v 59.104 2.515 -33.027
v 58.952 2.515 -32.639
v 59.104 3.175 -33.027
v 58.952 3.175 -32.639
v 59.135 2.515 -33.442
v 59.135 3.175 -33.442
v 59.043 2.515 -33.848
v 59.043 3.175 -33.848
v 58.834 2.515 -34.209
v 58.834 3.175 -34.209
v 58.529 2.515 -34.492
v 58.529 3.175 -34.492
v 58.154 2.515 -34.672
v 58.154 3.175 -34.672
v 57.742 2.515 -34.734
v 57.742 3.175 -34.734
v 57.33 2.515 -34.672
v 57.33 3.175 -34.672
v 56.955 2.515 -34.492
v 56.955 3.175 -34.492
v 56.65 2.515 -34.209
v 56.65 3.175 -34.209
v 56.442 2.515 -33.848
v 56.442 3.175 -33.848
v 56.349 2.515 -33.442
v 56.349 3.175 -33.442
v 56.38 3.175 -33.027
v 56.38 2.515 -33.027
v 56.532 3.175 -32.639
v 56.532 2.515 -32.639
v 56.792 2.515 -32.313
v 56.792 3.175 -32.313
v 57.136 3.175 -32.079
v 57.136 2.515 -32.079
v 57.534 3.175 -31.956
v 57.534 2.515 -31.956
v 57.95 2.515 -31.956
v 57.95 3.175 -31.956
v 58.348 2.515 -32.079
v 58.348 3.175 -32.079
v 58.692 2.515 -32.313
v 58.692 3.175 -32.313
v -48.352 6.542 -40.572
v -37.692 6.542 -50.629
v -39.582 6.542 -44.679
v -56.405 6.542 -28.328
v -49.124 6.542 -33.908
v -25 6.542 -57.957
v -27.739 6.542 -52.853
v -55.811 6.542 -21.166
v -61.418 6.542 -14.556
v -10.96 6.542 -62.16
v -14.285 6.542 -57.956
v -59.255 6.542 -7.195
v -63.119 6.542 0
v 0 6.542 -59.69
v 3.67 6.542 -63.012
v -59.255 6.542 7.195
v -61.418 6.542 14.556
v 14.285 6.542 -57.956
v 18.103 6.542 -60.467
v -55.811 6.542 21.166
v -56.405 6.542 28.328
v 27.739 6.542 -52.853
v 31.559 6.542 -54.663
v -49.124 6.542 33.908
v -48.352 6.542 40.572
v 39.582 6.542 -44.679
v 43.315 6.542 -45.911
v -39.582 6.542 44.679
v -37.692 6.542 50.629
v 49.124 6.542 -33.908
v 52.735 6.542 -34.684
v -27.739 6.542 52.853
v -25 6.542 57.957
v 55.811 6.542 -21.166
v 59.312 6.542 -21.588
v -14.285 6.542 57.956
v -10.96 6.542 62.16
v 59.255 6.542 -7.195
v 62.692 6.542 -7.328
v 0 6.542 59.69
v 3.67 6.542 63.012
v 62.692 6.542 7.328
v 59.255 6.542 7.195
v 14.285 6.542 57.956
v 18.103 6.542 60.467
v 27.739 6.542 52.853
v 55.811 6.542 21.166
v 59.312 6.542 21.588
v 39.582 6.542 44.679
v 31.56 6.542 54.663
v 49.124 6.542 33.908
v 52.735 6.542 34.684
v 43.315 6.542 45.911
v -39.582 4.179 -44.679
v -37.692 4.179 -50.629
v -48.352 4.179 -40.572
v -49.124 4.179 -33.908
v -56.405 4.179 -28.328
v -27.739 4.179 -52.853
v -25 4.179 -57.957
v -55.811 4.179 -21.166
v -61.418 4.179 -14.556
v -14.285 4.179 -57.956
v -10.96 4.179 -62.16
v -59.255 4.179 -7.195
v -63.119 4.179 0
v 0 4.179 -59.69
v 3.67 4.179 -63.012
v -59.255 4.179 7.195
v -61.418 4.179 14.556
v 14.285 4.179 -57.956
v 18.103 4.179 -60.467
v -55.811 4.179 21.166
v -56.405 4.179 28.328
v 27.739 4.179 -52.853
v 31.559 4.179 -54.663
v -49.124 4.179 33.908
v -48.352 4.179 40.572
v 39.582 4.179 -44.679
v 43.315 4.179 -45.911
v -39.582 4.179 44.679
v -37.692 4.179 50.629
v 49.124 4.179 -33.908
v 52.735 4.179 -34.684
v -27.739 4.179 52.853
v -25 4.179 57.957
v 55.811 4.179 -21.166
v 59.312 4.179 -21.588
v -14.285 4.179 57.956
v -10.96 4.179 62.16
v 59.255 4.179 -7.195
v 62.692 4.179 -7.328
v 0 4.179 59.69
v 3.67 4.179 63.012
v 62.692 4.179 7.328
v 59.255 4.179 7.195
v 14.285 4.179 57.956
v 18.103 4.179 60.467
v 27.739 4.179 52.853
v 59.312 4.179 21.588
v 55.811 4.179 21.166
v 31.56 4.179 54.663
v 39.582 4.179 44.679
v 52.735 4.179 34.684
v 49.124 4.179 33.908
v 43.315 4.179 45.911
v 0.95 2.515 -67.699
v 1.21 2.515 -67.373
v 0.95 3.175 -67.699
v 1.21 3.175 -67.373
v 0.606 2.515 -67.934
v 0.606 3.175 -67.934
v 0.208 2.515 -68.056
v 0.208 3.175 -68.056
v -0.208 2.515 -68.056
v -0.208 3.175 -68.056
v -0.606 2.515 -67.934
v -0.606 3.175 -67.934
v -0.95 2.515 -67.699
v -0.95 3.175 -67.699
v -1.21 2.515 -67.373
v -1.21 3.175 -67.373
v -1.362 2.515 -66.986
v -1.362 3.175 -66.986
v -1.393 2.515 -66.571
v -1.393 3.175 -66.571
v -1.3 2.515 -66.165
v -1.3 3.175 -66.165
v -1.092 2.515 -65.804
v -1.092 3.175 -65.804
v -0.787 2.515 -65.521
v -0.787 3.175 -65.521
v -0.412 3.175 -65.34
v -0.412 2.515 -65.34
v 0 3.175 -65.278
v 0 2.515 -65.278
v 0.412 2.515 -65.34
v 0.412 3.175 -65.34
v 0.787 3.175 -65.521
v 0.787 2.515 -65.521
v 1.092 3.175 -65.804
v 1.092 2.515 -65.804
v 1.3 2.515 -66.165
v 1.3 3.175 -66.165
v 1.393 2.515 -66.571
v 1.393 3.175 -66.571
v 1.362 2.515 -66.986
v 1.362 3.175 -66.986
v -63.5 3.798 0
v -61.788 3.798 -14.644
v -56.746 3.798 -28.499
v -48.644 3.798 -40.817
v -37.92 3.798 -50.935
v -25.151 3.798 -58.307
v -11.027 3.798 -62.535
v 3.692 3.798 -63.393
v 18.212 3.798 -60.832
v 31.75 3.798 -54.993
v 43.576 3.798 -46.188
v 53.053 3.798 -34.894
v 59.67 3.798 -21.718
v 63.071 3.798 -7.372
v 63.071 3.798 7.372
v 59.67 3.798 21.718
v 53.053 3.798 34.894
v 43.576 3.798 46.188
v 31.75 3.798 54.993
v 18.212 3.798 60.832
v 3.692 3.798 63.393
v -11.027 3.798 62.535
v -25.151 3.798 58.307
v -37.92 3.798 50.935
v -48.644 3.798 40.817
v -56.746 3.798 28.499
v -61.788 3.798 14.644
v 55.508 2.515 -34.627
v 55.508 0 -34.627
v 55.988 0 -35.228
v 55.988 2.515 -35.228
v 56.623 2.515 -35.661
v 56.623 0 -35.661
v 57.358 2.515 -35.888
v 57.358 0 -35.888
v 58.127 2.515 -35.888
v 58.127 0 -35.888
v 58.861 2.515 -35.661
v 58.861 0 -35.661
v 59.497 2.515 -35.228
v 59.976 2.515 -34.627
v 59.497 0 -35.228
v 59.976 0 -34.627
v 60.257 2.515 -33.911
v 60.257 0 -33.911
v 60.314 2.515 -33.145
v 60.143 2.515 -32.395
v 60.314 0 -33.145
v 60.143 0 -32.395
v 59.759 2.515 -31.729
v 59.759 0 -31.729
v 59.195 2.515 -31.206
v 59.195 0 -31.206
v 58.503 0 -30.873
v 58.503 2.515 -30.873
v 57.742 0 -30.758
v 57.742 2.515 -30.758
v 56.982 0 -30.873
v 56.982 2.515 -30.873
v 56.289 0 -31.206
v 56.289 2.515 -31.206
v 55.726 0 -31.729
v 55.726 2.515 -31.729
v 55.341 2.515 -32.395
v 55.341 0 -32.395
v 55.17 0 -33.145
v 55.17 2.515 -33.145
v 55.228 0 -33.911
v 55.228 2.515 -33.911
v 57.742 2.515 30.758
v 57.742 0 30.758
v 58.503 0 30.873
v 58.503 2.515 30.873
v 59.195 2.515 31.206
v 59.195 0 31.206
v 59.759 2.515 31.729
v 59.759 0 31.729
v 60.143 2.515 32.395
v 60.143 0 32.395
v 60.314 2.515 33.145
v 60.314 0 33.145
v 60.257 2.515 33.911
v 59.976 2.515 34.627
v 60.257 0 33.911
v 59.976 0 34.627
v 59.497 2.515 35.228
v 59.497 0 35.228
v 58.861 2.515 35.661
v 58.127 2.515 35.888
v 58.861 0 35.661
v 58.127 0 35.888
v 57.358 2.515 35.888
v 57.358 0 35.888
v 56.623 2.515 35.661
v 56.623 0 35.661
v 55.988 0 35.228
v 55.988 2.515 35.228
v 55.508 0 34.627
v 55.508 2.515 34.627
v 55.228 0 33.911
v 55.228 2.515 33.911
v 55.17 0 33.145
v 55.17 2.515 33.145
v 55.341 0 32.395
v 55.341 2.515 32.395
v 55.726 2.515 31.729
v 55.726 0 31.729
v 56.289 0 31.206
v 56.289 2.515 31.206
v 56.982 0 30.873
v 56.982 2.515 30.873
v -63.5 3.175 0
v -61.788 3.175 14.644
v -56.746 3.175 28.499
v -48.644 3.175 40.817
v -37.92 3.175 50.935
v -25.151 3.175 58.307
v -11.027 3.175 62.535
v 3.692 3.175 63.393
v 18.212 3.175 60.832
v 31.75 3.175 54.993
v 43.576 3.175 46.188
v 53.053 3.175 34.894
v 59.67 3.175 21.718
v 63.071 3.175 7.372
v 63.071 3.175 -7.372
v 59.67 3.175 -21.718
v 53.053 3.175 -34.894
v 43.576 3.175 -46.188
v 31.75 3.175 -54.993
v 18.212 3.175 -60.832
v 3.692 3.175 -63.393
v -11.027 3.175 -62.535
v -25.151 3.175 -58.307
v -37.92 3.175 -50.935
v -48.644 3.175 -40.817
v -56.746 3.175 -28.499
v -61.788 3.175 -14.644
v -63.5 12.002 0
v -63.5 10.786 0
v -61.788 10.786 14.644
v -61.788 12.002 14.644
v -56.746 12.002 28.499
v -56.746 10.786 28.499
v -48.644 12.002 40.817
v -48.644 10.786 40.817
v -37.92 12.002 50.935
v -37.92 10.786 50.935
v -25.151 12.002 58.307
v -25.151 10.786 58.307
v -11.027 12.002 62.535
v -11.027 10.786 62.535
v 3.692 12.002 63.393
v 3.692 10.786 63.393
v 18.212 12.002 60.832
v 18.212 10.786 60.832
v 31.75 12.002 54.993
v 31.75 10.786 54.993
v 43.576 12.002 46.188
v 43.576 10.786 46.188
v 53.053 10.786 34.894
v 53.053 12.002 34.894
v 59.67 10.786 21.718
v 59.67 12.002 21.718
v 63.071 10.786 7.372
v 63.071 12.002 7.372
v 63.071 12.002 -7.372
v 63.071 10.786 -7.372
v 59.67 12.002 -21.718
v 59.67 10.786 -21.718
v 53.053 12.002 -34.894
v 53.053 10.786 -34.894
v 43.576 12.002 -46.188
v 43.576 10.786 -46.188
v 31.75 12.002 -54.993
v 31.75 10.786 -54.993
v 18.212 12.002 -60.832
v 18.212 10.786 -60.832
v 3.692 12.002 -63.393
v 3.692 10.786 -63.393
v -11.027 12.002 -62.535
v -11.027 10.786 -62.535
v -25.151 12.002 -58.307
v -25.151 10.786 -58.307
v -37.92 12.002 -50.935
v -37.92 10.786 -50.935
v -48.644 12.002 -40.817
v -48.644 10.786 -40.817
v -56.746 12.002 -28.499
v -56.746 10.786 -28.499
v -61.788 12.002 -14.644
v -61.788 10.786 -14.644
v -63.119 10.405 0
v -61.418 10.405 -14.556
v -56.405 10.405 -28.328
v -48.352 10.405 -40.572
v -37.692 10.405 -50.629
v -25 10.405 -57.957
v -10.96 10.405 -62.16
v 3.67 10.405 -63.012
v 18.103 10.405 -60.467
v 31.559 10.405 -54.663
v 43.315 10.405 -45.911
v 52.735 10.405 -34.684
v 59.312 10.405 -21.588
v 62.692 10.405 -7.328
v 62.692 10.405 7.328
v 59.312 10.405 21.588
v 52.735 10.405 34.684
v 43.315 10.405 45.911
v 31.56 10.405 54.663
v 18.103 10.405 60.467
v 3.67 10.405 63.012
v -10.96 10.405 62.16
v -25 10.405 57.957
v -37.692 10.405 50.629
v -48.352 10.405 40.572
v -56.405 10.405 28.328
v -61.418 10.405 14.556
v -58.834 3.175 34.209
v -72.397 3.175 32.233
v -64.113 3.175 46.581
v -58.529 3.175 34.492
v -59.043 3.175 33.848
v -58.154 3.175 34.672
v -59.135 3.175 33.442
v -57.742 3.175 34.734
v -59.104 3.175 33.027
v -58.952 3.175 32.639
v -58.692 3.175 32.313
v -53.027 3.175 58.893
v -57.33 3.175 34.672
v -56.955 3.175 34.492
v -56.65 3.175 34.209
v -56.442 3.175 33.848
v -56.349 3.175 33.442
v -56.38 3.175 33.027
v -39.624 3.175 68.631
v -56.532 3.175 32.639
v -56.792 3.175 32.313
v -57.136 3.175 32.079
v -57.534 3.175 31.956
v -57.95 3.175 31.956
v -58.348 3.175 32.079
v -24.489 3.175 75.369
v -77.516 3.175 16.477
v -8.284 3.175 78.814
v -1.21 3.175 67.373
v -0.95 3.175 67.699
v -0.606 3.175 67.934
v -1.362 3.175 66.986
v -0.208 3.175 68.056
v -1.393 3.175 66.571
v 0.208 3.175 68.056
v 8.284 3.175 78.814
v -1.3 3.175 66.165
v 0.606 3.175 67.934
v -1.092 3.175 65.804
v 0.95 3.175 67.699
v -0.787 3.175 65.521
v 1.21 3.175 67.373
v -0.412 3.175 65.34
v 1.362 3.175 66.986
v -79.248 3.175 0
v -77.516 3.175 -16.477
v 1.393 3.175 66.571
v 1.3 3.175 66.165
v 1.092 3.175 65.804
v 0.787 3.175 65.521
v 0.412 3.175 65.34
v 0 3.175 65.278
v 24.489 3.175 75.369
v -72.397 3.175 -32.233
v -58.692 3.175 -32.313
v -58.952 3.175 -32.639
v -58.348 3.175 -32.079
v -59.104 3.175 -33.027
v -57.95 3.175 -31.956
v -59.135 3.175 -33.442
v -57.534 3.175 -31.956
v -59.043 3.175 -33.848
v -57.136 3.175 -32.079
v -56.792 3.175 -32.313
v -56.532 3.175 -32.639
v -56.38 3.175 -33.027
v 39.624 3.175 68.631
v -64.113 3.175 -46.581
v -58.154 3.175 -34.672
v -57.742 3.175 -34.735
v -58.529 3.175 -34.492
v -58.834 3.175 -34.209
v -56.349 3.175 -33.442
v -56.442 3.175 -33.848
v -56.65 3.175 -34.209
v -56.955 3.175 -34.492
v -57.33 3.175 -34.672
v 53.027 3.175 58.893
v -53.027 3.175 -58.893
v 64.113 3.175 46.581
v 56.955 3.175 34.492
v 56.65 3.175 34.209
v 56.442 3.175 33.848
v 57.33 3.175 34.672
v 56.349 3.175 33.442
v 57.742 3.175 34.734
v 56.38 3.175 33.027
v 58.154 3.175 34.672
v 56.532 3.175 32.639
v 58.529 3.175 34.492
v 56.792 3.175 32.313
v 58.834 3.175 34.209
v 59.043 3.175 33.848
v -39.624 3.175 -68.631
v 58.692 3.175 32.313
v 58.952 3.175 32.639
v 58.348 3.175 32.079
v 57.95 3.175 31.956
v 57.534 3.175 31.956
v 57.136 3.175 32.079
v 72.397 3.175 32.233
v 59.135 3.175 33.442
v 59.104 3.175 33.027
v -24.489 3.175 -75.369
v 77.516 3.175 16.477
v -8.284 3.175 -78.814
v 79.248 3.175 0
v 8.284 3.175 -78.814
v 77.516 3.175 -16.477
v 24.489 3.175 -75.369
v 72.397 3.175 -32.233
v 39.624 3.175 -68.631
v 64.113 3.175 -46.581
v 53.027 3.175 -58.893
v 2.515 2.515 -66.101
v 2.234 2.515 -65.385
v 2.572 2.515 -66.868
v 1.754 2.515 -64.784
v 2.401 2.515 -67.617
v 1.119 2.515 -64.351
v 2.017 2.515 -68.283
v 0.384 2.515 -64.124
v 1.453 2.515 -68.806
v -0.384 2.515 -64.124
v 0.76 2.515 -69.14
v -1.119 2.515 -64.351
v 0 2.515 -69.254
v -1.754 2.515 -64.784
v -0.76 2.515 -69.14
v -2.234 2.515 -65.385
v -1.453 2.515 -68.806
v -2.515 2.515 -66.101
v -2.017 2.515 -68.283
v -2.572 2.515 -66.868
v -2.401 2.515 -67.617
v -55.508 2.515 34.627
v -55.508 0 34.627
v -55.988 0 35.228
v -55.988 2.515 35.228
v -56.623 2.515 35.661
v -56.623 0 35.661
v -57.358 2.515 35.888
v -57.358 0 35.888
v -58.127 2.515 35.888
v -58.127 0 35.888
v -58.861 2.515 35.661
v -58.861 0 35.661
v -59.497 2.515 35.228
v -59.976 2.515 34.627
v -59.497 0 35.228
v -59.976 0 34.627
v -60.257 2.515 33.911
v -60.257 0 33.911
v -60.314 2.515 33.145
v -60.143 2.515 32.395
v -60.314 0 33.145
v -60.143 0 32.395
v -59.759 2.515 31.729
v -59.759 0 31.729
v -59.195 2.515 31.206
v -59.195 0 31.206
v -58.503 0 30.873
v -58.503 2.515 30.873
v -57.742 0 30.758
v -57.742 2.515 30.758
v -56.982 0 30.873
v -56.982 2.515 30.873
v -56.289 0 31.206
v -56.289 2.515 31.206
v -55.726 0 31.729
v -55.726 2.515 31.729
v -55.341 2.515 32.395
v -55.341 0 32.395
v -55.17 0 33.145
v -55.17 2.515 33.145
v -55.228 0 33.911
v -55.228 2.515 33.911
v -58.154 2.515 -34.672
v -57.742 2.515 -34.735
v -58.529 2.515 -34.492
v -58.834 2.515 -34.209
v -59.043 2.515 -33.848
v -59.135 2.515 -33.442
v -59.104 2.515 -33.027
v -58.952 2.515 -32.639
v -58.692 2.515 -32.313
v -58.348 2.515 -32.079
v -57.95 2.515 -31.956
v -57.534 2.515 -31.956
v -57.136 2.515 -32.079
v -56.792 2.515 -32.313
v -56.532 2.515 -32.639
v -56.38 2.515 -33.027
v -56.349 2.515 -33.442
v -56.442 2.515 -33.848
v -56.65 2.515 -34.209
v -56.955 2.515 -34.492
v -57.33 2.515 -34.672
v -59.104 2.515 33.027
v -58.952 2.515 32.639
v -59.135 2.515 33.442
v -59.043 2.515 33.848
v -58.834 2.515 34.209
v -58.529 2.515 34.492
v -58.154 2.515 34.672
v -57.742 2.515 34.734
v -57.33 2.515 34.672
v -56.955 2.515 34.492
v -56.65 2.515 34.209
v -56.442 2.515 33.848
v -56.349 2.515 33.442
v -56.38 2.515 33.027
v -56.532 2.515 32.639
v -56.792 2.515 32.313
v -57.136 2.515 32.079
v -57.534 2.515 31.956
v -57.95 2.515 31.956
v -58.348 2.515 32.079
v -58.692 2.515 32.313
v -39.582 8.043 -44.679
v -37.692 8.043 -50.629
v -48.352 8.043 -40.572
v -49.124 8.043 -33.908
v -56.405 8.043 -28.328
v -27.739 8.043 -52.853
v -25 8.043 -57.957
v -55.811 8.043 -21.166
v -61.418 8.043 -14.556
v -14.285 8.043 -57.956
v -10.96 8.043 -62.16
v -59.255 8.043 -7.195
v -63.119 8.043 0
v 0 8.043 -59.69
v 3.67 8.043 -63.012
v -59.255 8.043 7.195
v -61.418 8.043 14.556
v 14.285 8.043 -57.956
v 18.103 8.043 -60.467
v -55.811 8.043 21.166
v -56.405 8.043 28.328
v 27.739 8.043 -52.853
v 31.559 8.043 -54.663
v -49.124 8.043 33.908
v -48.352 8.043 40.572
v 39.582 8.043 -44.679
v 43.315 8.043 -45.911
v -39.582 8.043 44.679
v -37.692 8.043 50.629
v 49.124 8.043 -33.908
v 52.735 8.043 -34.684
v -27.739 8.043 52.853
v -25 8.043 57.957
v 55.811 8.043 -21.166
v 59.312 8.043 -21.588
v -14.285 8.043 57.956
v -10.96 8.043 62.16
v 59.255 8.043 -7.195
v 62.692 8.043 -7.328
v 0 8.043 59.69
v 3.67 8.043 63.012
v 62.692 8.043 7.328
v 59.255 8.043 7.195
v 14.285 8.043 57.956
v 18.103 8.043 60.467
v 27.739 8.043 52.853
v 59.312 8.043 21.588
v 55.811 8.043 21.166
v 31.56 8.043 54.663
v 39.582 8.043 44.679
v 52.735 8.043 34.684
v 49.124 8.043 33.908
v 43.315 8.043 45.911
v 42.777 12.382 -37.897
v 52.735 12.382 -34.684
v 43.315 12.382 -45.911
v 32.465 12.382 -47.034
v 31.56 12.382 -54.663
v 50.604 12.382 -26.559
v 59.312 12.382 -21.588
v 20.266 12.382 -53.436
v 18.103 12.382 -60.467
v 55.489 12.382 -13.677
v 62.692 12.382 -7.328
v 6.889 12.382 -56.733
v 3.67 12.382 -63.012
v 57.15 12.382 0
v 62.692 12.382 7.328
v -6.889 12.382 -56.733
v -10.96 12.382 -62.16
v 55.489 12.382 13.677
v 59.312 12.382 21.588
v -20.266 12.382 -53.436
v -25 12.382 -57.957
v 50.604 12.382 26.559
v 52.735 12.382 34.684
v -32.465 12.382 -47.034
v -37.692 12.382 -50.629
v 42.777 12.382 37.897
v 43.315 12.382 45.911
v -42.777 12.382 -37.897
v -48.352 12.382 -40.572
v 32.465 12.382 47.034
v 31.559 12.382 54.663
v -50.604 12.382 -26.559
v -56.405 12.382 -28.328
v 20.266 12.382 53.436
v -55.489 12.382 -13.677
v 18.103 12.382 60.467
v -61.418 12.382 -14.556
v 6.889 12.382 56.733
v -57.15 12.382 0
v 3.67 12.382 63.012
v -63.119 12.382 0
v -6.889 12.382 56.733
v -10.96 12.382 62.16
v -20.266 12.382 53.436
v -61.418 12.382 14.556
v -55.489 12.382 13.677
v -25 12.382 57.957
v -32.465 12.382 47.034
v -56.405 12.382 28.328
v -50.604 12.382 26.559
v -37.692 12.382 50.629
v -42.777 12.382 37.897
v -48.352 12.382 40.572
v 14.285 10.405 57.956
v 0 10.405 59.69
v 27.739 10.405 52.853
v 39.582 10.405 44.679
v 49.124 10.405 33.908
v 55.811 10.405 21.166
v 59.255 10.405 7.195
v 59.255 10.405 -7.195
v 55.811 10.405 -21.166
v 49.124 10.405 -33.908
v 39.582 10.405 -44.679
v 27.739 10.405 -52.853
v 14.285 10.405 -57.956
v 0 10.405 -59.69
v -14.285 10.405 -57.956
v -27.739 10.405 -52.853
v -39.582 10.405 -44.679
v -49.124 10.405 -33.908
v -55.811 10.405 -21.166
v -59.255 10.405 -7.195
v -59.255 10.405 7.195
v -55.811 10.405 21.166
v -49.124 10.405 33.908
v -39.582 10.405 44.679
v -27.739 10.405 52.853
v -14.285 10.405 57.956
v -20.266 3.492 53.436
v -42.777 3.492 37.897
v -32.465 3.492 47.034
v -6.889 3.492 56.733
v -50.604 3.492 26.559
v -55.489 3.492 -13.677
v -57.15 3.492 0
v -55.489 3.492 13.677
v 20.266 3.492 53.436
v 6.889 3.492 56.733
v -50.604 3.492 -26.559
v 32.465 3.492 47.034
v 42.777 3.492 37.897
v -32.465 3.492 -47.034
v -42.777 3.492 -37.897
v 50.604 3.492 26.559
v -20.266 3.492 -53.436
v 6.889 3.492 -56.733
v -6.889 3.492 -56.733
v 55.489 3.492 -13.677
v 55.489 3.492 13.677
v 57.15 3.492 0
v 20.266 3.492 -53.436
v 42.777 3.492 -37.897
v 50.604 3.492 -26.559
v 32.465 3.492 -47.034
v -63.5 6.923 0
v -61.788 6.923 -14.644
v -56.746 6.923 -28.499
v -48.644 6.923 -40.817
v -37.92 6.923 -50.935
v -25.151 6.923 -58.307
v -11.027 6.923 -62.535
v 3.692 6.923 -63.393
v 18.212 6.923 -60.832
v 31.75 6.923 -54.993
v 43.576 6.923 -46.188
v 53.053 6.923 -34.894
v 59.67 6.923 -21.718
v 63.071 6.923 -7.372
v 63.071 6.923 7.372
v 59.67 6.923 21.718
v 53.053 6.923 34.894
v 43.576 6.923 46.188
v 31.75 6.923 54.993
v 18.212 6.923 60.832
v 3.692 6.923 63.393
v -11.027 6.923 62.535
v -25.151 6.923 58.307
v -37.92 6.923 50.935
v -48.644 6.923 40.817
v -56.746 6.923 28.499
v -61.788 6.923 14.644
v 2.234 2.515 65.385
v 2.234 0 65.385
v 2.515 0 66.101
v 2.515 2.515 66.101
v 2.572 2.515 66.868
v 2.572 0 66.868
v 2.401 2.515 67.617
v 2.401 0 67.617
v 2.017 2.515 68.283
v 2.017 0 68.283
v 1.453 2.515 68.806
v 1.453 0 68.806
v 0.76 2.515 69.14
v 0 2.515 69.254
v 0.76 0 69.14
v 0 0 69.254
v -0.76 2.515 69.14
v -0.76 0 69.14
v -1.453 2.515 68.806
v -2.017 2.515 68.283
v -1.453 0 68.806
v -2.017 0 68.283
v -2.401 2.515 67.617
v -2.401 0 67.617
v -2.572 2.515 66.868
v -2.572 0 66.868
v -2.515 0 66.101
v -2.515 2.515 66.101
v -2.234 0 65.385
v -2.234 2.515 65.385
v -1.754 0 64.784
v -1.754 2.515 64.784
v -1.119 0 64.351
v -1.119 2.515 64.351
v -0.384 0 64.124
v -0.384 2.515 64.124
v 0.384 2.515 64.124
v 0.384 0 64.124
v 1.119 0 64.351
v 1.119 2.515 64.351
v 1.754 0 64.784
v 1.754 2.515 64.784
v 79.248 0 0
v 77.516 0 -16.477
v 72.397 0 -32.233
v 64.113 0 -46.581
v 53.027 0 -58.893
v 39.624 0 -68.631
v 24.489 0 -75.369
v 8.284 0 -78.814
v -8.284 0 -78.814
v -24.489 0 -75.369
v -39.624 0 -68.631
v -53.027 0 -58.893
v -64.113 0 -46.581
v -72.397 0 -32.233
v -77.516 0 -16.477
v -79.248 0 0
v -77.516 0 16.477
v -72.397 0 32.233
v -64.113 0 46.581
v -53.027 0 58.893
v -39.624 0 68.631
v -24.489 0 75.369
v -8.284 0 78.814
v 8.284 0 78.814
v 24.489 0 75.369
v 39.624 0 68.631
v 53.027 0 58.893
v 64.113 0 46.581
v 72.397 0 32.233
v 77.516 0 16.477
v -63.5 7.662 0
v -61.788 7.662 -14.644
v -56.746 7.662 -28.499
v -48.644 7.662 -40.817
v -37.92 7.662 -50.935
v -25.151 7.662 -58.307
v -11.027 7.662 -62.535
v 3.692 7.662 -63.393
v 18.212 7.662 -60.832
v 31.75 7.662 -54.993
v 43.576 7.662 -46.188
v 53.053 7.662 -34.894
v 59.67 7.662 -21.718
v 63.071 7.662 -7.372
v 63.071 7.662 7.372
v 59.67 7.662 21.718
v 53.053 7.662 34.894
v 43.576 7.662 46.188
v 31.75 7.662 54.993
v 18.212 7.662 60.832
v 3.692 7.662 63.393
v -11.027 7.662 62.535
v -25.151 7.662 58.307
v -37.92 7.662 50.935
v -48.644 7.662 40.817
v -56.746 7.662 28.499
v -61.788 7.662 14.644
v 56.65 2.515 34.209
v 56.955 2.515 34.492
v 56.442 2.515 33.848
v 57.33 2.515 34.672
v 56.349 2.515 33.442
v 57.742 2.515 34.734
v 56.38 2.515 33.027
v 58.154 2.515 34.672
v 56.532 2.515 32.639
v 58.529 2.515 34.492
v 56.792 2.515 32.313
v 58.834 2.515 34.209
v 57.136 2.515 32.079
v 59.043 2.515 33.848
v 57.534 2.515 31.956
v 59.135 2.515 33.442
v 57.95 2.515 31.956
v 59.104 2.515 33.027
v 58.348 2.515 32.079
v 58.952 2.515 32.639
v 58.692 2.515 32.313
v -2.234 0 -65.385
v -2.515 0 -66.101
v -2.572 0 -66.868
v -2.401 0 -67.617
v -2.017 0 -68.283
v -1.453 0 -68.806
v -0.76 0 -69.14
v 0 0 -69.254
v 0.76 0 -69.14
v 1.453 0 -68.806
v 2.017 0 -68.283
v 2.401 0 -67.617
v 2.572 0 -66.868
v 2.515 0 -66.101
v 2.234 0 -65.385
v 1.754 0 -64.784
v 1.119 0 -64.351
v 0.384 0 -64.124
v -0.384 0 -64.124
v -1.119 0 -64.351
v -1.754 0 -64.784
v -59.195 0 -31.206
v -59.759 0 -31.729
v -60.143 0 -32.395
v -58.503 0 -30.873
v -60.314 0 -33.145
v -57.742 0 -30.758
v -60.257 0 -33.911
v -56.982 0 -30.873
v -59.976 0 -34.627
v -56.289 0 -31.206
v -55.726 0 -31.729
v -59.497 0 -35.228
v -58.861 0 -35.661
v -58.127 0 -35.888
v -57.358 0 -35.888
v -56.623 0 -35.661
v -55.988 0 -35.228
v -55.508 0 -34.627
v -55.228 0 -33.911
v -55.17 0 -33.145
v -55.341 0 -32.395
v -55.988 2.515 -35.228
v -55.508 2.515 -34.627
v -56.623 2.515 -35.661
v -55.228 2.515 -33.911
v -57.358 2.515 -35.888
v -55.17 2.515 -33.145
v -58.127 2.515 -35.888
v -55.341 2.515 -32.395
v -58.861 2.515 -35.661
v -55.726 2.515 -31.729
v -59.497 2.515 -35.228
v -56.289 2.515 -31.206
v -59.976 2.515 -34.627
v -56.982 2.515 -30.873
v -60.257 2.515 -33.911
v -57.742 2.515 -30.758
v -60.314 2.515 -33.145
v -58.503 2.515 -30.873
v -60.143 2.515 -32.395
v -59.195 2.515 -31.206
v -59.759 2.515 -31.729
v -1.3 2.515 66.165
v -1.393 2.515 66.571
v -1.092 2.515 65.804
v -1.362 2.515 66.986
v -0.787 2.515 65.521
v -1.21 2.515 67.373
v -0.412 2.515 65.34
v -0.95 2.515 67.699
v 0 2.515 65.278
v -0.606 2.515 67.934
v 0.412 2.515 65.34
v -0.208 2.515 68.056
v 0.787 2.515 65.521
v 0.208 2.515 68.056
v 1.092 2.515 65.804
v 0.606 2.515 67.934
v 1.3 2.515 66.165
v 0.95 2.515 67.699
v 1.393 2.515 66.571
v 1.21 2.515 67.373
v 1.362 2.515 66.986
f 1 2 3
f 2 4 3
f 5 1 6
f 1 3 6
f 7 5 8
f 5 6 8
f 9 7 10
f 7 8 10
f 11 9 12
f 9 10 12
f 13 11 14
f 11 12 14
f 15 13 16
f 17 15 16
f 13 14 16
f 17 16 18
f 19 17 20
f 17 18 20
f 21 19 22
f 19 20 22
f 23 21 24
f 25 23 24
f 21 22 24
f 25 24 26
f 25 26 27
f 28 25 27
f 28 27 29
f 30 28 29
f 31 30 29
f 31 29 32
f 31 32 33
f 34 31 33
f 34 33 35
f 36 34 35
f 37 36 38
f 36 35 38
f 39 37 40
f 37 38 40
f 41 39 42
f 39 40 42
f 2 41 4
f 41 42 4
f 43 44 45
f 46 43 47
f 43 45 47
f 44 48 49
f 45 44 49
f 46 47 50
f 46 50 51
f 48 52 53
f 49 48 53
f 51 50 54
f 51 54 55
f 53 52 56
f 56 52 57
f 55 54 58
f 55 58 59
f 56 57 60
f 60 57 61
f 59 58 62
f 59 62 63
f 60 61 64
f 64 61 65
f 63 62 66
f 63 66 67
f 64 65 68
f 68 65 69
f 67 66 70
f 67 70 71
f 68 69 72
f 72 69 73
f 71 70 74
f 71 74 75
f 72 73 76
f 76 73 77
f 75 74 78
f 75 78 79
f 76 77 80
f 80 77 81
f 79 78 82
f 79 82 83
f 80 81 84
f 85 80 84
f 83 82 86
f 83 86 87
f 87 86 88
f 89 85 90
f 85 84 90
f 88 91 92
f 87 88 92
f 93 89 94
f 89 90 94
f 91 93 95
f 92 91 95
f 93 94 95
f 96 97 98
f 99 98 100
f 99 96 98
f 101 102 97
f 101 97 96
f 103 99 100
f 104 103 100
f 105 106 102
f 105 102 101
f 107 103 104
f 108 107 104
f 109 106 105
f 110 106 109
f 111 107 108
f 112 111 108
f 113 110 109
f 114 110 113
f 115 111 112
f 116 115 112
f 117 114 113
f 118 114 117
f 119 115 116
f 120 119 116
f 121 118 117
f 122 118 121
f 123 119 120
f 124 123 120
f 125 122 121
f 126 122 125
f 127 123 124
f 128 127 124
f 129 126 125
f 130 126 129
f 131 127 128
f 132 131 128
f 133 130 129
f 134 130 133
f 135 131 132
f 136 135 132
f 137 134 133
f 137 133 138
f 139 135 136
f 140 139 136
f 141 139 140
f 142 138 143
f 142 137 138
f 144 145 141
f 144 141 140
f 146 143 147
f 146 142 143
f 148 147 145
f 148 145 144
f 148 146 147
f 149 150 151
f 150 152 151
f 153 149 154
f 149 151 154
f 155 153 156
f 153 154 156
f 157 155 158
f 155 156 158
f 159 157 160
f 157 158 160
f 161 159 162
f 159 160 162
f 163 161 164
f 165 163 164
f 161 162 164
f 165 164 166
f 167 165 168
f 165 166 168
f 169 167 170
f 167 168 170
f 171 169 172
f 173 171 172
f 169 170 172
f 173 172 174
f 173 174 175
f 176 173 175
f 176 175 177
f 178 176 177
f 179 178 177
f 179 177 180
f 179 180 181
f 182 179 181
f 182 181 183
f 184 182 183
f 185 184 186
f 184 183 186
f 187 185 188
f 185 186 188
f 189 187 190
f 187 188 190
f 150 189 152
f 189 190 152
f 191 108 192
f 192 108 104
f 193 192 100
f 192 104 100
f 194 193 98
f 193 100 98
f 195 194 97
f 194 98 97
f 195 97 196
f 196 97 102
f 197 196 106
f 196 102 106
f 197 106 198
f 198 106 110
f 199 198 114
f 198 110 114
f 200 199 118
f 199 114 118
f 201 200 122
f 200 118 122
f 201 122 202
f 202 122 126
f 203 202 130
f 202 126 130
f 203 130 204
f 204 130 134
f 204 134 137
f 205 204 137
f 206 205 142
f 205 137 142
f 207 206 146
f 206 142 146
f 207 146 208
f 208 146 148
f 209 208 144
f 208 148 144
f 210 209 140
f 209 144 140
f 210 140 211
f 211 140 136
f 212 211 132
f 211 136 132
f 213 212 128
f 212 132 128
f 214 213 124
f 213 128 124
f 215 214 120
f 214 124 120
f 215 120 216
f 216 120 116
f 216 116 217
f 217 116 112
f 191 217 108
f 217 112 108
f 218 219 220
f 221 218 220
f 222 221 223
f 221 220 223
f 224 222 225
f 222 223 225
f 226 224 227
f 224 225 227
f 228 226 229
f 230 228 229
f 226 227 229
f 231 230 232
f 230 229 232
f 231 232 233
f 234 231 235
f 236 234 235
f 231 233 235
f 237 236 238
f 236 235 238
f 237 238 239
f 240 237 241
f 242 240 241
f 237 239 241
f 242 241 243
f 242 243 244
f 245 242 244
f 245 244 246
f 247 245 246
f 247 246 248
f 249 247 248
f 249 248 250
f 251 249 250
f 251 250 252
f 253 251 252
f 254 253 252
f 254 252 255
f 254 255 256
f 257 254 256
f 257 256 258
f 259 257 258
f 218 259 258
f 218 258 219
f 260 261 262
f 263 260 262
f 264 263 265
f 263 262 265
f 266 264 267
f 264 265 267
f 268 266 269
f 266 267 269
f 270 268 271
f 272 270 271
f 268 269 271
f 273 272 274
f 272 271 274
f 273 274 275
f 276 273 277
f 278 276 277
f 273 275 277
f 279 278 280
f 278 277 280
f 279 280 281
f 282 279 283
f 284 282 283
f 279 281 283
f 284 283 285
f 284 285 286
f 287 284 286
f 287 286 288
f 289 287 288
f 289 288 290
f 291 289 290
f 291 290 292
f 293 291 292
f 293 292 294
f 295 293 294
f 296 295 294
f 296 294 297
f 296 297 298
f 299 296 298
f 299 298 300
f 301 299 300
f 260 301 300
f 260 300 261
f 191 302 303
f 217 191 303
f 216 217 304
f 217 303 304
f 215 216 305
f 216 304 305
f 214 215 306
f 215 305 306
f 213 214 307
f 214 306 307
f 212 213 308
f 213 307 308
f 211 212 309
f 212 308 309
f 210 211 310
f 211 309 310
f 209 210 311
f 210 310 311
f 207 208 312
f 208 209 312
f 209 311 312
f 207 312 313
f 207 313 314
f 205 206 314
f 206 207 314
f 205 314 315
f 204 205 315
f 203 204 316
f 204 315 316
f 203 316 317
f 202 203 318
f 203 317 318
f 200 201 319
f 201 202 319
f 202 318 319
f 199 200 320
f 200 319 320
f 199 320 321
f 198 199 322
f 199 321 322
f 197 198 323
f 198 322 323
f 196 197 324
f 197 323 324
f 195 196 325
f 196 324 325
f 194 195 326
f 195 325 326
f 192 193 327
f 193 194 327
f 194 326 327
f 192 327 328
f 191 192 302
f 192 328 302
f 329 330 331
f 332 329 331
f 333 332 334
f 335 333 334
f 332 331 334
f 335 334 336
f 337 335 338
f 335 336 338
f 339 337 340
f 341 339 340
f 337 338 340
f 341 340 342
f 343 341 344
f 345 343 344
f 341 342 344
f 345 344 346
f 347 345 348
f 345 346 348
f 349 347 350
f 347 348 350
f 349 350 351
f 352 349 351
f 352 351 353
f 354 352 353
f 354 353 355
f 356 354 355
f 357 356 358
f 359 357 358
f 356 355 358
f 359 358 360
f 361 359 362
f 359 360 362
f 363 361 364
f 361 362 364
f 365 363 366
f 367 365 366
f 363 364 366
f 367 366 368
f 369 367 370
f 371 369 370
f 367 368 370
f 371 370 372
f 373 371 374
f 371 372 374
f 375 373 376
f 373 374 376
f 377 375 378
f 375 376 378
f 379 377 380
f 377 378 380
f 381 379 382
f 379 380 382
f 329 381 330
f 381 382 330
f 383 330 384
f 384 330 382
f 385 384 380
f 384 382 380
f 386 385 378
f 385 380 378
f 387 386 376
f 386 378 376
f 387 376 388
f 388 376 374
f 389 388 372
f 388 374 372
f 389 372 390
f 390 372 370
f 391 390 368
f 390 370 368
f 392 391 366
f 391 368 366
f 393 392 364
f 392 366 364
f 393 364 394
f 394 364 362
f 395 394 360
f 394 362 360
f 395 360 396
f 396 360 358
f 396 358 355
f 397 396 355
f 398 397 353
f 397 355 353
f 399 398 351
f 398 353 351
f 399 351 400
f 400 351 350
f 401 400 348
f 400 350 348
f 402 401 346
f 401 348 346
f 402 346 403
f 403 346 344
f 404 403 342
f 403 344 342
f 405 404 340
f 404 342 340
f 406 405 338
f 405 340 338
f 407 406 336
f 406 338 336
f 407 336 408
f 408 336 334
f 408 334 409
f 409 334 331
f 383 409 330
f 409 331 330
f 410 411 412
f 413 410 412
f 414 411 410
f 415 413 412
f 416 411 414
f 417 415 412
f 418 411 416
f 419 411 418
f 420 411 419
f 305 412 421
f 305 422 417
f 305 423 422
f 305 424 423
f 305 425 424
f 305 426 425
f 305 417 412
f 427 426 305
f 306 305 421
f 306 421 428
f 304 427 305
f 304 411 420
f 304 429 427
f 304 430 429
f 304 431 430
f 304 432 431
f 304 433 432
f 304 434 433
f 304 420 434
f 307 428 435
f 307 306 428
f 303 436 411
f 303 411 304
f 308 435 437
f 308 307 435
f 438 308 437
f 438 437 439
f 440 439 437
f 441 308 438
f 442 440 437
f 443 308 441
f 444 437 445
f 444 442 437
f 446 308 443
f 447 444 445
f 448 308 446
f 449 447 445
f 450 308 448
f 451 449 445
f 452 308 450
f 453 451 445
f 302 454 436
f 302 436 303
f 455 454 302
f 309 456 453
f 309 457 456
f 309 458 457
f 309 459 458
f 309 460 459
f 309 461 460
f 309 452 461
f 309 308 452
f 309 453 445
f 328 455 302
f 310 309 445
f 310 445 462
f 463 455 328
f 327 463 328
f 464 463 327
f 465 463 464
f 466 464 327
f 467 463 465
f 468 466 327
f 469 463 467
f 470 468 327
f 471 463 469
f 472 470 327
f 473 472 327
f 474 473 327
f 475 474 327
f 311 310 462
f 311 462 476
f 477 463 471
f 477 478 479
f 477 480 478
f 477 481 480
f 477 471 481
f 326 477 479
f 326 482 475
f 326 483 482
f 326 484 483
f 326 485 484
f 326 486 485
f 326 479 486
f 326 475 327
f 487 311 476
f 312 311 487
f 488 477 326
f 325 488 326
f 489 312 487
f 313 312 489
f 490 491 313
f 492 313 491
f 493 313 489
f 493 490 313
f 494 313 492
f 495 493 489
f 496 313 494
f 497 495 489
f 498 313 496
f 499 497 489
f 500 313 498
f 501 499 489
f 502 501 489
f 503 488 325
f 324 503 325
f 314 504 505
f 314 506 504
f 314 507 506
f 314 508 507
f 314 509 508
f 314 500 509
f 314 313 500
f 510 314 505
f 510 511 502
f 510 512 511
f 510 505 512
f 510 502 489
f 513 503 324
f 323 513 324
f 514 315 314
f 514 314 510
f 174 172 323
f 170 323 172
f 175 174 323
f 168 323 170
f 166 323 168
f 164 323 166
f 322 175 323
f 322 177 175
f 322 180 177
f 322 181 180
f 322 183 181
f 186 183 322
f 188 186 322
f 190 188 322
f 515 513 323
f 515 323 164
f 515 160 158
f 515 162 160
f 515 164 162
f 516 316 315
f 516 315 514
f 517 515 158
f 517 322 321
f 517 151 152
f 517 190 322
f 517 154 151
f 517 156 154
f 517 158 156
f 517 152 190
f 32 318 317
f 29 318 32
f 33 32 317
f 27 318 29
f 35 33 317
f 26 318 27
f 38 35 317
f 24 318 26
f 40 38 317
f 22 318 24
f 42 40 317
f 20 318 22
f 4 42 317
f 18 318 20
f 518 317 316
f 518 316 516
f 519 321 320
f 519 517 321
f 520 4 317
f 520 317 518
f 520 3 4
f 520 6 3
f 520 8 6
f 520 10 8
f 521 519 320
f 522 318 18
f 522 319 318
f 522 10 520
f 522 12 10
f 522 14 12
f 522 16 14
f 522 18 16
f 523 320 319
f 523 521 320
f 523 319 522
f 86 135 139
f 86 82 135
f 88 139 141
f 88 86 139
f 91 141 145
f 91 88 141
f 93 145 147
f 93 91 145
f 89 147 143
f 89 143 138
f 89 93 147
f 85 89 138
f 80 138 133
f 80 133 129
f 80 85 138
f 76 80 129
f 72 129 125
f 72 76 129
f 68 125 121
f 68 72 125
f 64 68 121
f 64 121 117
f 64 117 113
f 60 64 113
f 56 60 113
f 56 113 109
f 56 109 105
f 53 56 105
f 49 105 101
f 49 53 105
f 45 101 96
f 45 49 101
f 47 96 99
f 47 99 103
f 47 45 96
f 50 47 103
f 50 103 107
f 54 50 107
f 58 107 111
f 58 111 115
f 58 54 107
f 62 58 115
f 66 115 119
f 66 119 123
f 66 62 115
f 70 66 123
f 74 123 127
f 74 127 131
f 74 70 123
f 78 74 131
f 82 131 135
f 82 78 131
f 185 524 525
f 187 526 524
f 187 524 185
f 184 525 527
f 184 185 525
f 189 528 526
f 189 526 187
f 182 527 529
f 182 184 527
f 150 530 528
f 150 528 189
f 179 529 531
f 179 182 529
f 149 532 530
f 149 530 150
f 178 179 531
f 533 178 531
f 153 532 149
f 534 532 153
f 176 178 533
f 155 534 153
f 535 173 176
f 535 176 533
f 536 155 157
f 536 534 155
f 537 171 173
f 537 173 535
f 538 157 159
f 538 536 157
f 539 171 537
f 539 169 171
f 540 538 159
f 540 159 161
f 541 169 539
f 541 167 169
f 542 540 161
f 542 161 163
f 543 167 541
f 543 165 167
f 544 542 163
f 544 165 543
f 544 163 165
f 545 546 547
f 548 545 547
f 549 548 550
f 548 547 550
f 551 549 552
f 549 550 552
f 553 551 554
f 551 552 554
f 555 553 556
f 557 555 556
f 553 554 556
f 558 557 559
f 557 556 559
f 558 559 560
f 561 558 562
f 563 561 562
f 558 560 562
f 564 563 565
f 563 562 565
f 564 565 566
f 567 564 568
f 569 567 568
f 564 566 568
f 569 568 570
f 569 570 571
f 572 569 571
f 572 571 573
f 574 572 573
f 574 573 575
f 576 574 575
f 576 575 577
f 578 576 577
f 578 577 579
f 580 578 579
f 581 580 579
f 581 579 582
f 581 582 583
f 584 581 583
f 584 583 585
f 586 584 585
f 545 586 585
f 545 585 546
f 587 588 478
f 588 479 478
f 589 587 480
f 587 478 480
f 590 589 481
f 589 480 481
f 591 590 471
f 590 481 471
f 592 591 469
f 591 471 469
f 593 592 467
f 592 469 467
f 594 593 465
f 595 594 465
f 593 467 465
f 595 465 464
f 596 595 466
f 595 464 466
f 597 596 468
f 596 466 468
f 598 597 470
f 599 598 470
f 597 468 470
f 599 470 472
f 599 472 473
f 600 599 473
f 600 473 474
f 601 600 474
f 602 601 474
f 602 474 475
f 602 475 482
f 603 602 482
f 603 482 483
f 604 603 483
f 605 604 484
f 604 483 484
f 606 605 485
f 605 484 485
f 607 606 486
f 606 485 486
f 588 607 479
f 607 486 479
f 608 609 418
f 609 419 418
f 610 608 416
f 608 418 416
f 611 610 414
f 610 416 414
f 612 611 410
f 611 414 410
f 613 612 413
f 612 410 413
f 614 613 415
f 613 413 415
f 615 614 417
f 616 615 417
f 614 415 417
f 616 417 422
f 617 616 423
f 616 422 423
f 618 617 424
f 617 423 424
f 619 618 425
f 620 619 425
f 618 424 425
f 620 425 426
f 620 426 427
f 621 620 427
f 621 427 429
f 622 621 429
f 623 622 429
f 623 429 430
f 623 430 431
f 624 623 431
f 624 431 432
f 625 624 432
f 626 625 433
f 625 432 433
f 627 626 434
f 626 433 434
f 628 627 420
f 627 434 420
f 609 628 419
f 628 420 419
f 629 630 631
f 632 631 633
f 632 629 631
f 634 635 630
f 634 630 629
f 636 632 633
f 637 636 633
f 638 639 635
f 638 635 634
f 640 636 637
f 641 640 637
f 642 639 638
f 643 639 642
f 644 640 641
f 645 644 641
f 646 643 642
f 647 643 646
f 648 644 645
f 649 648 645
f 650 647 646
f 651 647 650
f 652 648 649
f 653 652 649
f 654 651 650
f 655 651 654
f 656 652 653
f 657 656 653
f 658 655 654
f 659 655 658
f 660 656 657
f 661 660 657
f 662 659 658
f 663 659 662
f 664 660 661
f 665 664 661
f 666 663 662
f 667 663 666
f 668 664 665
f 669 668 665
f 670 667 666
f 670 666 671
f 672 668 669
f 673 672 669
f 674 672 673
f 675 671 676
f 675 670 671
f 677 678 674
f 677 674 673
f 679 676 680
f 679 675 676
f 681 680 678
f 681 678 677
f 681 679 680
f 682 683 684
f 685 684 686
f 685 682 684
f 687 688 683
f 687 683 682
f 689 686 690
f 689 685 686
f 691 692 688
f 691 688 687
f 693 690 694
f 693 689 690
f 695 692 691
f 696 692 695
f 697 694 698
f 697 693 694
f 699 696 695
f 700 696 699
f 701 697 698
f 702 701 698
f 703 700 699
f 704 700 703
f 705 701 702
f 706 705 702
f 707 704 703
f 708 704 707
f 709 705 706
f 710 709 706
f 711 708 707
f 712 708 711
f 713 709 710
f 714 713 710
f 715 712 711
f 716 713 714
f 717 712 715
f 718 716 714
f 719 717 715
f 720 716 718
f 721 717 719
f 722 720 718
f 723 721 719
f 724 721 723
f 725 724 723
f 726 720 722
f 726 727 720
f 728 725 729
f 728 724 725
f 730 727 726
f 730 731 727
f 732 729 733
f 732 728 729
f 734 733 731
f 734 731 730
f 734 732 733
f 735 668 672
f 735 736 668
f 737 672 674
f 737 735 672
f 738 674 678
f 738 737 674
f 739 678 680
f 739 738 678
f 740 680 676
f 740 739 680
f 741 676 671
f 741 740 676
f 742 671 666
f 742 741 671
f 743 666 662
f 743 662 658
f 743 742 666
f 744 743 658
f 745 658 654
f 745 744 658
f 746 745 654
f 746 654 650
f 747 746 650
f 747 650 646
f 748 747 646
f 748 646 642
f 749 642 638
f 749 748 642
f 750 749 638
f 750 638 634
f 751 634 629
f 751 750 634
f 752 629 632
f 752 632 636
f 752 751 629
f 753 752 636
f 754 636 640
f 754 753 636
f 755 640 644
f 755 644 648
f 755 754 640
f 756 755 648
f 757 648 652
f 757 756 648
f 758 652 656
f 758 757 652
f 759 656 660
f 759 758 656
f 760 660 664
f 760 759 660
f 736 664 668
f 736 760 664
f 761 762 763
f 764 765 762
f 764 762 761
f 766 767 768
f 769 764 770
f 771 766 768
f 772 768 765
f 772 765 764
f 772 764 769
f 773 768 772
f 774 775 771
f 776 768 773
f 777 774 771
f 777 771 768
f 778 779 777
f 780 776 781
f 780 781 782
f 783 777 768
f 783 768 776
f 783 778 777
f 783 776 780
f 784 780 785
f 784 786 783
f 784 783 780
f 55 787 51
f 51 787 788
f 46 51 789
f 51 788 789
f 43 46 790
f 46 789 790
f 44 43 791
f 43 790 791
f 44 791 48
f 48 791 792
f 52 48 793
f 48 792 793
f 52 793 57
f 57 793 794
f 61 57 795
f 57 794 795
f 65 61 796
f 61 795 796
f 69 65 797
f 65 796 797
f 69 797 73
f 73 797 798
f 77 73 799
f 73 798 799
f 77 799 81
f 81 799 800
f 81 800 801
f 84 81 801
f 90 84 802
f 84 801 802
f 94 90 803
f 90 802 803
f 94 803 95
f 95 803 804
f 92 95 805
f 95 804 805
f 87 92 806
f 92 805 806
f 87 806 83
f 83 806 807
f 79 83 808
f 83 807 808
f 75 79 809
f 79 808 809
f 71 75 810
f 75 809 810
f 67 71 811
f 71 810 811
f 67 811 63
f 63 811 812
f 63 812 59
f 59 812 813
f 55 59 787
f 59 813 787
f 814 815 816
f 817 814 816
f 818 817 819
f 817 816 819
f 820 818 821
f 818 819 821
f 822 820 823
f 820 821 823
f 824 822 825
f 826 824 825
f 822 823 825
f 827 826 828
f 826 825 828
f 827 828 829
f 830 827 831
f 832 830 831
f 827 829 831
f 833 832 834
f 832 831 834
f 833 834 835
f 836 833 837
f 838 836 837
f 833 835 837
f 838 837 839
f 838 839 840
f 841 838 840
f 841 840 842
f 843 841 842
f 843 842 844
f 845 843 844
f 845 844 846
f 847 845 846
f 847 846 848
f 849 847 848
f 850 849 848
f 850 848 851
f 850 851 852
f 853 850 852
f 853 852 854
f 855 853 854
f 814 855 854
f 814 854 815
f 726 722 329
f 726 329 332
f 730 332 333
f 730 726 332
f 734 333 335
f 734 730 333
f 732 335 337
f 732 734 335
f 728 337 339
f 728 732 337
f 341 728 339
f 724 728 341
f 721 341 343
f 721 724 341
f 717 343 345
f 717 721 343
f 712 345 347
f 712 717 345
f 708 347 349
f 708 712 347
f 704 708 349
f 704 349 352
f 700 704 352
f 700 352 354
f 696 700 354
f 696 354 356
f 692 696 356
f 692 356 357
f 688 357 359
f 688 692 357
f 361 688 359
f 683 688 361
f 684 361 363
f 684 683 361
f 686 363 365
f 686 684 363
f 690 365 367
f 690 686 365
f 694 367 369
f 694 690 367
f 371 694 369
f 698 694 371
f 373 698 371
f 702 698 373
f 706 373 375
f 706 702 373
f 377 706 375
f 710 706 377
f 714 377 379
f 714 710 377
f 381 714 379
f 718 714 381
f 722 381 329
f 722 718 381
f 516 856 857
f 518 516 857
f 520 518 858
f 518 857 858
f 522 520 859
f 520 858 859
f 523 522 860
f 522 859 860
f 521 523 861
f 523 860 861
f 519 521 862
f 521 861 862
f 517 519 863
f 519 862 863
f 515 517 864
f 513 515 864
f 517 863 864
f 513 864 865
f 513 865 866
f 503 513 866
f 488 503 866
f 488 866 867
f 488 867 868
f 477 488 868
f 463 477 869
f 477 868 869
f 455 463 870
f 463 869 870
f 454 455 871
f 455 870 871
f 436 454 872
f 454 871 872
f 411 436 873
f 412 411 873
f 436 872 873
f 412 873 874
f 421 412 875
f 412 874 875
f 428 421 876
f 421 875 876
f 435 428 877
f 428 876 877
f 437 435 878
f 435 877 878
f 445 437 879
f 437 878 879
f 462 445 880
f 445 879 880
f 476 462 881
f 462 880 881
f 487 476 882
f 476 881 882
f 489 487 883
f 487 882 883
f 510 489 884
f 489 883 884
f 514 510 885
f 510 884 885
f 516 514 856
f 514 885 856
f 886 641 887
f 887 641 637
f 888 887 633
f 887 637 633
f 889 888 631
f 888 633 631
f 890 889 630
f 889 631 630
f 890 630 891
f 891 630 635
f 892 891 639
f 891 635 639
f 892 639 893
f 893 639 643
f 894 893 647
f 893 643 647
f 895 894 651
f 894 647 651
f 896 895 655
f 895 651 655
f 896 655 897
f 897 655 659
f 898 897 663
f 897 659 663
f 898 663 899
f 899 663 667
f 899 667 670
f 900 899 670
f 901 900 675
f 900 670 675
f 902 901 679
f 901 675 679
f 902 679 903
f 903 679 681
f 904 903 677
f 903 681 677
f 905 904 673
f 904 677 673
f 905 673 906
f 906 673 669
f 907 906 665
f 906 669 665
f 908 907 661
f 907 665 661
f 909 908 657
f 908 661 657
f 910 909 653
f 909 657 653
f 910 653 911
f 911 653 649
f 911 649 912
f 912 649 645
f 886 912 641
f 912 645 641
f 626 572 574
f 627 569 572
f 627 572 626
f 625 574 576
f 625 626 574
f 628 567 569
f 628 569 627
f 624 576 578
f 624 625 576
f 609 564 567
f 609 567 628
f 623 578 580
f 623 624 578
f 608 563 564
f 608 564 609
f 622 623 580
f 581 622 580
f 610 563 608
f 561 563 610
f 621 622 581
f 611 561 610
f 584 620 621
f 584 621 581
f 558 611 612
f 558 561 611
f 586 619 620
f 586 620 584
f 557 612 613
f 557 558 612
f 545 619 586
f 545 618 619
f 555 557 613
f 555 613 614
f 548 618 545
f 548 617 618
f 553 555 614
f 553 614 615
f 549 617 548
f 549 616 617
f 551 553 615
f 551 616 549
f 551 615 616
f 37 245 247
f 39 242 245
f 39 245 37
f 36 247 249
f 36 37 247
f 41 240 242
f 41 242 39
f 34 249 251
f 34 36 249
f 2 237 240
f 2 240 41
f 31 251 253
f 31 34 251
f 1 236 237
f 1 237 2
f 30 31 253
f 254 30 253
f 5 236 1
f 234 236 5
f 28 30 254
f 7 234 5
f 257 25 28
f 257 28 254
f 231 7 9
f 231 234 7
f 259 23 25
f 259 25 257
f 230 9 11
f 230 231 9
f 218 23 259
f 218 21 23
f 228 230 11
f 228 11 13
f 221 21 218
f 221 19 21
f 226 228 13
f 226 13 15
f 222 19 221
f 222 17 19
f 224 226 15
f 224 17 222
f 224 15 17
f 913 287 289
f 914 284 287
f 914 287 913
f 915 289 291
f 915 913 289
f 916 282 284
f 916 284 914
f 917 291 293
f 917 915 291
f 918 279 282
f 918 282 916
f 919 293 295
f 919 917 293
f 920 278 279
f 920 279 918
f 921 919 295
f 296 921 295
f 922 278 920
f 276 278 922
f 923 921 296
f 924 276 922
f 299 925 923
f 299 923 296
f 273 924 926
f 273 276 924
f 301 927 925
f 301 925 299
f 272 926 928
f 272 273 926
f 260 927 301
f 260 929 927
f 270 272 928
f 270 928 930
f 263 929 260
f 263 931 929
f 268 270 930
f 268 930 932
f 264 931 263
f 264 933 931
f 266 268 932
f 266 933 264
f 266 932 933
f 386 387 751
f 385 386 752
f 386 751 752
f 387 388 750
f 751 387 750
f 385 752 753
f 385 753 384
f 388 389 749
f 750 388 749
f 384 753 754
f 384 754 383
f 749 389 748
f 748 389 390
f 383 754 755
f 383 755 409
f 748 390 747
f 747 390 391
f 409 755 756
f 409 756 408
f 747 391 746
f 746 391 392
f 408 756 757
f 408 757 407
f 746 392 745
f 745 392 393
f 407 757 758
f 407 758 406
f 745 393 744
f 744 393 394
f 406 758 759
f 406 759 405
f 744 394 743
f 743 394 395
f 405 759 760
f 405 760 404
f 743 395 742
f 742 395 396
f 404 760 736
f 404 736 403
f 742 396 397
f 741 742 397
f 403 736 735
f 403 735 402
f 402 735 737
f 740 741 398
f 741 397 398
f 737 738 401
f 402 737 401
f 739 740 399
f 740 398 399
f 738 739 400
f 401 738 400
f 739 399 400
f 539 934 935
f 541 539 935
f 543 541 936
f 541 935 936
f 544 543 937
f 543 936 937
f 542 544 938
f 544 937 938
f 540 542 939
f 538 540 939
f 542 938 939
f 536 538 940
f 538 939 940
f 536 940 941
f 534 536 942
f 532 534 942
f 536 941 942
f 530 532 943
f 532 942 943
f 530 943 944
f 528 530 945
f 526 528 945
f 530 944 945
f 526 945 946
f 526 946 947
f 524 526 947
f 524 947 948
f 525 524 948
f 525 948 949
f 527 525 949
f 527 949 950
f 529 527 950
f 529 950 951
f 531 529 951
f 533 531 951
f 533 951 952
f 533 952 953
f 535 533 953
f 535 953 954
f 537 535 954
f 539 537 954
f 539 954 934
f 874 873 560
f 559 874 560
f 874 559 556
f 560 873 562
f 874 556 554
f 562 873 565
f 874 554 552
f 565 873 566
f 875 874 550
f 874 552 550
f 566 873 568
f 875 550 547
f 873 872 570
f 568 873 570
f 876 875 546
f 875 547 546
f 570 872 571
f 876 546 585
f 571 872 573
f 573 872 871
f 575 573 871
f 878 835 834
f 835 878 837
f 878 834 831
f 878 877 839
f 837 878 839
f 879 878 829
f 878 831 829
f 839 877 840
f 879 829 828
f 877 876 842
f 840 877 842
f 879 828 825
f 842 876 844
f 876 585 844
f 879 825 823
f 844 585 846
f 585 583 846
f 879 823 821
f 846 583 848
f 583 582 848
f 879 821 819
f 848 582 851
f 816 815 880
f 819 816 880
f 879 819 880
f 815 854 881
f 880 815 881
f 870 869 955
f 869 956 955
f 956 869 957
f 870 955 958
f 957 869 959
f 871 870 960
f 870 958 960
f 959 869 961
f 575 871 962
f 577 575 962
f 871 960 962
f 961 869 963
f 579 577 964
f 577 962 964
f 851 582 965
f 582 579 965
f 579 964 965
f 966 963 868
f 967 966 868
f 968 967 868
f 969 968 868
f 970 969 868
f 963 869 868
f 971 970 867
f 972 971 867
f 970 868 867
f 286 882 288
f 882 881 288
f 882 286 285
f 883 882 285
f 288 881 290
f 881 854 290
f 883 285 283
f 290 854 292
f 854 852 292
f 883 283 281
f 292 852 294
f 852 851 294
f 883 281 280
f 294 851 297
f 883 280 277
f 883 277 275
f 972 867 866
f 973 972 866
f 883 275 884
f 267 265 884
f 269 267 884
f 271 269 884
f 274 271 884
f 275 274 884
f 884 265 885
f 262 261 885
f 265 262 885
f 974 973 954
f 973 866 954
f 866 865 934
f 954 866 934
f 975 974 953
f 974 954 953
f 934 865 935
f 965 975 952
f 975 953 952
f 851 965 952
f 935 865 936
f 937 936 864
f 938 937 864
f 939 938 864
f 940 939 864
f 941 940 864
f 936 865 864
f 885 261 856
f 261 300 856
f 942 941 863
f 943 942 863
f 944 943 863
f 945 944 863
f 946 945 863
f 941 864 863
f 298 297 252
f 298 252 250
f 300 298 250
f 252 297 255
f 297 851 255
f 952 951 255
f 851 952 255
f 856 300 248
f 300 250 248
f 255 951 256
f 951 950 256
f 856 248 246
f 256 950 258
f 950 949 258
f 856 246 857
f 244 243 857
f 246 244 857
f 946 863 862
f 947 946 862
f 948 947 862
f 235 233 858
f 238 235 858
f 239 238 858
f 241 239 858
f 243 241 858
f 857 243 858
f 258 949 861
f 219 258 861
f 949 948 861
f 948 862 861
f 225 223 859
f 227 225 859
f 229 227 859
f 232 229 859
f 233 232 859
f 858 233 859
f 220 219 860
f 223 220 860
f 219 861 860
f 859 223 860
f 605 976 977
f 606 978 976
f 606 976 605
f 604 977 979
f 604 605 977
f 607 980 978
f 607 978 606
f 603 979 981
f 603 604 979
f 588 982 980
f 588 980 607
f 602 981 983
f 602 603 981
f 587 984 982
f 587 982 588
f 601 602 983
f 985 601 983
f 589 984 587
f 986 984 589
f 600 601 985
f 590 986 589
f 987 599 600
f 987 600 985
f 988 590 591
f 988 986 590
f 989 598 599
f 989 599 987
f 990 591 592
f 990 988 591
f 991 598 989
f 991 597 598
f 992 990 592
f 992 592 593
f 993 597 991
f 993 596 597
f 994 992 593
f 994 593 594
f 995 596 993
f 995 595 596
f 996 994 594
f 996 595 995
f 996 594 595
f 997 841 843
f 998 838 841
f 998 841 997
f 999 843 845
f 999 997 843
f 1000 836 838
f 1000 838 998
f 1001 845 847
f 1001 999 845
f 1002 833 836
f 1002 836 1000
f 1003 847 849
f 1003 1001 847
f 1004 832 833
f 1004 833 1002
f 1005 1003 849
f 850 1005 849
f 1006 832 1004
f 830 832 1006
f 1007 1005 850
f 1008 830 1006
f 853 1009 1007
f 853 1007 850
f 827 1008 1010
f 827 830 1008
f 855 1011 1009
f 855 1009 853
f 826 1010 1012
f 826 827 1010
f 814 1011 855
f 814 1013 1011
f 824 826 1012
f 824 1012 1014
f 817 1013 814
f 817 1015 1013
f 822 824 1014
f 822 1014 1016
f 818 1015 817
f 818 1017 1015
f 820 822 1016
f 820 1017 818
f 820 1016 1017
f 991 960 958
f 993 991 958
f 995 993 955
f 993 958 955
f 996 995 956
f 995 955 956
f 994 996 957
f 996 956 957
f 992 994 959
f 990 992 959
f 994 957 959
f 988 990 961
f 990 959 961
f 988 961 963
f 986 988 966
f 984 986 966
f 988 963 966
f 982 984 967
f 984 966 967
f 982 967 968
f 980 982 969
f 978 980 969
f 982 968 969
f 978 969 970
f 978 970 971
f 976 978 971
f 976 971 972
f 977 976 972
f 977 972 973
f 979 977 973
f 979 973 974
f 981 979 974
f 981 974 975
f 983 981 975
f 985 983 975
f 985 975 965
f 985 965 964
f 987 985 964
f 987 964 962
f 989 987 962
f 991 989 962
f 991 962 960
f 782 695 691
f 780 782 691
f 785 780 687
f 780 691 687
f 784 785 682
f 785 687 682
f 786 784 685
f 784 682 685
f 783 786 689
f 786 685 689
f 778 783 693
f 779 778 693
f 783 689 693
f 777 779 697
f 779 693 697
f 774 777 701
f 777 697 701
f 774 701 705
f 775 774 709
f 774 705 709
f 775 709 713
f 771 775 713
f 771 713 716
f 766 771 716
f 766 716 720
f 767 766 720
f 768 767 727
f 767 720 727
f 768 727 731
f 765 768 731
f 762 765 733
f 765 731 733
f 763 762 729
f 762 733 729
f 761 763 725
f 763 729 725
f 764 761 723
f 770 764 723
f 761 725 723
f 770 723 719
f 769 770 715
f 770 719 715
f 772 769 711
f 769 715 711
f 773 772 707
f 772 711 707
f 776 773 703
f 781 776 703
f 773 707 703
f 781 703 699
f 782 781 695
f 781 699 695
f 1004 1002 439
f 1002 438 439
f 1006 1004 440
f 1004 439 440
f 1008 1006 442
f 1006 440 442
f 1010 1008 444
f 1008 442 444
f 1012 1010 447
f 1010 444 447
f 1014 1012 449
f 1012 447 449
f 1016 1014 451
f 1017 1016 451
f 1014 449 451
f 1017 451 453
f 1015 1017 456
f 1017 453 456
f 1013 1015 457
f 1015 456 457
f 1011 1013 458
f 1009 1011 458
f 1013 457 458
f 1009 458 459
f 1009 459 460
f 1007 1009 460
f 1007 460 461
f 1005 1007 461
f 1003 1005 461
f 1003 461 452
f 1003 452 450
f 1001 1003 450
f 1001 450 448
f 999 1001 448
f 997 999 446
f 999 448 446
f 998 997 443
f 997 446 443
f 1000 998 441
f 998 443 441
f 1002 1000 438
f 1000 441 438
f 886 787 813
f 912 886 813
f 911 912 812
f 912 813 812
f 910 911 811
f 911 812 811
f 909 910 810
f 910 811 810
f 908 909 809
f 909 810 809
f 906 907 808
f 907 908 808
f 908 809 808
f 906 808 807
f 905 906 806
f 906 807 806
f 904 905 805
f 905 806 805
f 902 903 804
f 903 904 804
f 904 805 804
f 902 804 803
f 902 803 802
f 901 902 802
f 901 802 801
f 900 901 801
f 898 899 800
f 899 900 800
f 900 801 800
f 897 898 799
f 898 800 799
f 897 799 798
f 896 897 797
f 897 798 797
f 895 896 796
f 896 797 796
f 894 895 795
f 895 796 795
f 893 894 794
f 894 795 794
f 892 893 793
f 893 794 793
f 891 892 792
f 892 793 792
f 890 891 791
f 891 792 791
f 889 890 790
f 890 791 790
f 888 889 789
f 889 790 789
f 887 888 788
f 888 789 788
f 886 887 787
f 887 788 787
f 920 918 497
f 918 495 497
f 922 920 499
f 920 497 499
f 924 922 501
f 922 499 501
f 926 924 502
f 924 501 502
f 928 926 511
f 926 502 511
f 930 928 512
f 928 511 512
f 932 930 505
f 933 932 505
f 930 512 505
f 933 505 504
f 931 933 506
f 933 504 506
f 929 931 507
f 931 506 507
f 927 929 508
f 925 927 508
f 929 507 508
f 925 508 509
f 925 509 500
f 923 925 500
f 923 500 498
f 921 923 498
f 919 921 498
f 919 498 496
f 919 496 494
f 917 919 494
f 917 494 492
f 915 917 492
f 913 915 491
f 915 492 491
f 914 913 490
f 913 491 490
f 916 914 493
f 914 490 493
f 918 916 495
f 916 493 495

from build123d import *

# Parameters (mm, degrees)
SKETCH1_R                                      = 79.248
EXTRUDE1_DEPTH                                 = 3.175
SKETCH2_R                                      = 63.5
EXTRUDE2_DEPTH                                 = 9.2075
SKETCH4_W                                      = 3.81
SKETCH4_H                                      = 2.3622
CHAMFER1_SIZE                                  = 0.381
SKETCH8_R                                      = 57.15
CUT_EXTRUDE1_DEPTH                             = 8.89
CBORE_FOR_3_SOCKET_HEAD_CAP_SCREW1_D           = 2.794
CBORE_FOR_3_SOCKET_HEAD_CAP_SCREW1_CBORE_D     = 5.15874
CBORE_FOR_3_SOCKET_HEAD_CAP_SCREW1_CBORE_DEPTH = 2.5146
CIRPATTERN1_COUNT                              = 6


with BuildPart() as part:
    # Sketch1 → Extrude1 (new body)
    with BuildSketch(Plane(origin=(0, 0, 0), x_dir=(1, 0, 0), z_dir=(0, 1, 0))):
        Circle(SKETCH1_R)
    extrude(amount=EXTRUDE1_DEPTH)

    # Sketch2 → Extrude2 (add)
    with BuildSketch(Plane(origin=(0, 3.175, 0), x_dir=(-1, 0, 0), z_dir=(0, 1, 0))):
        Circle(SKETCH2_R)
    extrude(amount=EXTRUDE2_DEPTH)

    # Sketch4 → Cut-Revolve7 (revolve, cut)
    with BuildSketch(Plane(origin=(0, 0, 0), x_dir=(0, 0, -1), z_dir=(1, 0, 0))):
        with Locations((-61.595, 9.224034757)):
            Rectangle(SKETCH4_W, SKETCH4_H)
        with Locations((-61.595, 5.360539726)):
            Rectangle(SKETCH4_W, SKETCH4_H)
    revolve(axis=Axis((0, 0, 0), (0, 1, 0)), mode=Mode.SUBTRACT)

    # Chamfer1
    chamfer1_edges = [part.edges().sort_by_distance(p)[0] for p in [
        (63.5, 12.3825, 0),
        (63.5, 4.179439726, 0),
        (63.5, 6.541639726, 0),
        (63.5, 8.042934757, 0),
        (63.5, 10.405134757, 0),
    ]]
    chamfer(chamfer1_edges, length=CHAMFER1_SIZE)

    # Sketch8 → Cut-Extrude1 (cut)
    with BuildSketch(Plane(origin=(0, 12.3825, 0), x_dir=(1, 0, 0), z_dir=(0, 1, 0))):
        Circle(SKETCH8_R)
    extrude(amount=-CUT_EXTRUDE1_DEPTH, mode=Mode.SUBTRACT)

    # CBORE for #3 Socket Head Cap Screw1 (through all)
    with Locations(Plane(origin=(57.742243797, 0, 33.3375), x_dir=(0, 0, -1), z_dir=(0, -1, 0))):
        with Locations((0, 0)):
            cbore_for_3_socket_head_cap_screw1 = CounterBoreHole(CBORE_FOR_3_SOCKET_HEAD_CAP_SCREW1_D / 2, CBORE_FOR_3_SOCKET_HEAD_CAP_SCREW1_CBORE_D / 2, CBORE_FOR_3_SOCKET_HEAD_CAP_SCREW1_CBORE_DEPTH)

    # CirPattern1: CBORE for #3 Socket Head Cap Screw1 ×6 about axis
    cirpattern1_axis = Axis((0, -73.968573618, 0), (0, 1, 0))
    for i in range(1, CIRPATTERN1_COUNT):
        add(cbore_for_3_socket_head_cap_screw1.rotate(cirpattern1_axis, i * 360 / CIRPATTERN1_COUNT), mode=Mode.SUBTRACT)


solid = part.part
